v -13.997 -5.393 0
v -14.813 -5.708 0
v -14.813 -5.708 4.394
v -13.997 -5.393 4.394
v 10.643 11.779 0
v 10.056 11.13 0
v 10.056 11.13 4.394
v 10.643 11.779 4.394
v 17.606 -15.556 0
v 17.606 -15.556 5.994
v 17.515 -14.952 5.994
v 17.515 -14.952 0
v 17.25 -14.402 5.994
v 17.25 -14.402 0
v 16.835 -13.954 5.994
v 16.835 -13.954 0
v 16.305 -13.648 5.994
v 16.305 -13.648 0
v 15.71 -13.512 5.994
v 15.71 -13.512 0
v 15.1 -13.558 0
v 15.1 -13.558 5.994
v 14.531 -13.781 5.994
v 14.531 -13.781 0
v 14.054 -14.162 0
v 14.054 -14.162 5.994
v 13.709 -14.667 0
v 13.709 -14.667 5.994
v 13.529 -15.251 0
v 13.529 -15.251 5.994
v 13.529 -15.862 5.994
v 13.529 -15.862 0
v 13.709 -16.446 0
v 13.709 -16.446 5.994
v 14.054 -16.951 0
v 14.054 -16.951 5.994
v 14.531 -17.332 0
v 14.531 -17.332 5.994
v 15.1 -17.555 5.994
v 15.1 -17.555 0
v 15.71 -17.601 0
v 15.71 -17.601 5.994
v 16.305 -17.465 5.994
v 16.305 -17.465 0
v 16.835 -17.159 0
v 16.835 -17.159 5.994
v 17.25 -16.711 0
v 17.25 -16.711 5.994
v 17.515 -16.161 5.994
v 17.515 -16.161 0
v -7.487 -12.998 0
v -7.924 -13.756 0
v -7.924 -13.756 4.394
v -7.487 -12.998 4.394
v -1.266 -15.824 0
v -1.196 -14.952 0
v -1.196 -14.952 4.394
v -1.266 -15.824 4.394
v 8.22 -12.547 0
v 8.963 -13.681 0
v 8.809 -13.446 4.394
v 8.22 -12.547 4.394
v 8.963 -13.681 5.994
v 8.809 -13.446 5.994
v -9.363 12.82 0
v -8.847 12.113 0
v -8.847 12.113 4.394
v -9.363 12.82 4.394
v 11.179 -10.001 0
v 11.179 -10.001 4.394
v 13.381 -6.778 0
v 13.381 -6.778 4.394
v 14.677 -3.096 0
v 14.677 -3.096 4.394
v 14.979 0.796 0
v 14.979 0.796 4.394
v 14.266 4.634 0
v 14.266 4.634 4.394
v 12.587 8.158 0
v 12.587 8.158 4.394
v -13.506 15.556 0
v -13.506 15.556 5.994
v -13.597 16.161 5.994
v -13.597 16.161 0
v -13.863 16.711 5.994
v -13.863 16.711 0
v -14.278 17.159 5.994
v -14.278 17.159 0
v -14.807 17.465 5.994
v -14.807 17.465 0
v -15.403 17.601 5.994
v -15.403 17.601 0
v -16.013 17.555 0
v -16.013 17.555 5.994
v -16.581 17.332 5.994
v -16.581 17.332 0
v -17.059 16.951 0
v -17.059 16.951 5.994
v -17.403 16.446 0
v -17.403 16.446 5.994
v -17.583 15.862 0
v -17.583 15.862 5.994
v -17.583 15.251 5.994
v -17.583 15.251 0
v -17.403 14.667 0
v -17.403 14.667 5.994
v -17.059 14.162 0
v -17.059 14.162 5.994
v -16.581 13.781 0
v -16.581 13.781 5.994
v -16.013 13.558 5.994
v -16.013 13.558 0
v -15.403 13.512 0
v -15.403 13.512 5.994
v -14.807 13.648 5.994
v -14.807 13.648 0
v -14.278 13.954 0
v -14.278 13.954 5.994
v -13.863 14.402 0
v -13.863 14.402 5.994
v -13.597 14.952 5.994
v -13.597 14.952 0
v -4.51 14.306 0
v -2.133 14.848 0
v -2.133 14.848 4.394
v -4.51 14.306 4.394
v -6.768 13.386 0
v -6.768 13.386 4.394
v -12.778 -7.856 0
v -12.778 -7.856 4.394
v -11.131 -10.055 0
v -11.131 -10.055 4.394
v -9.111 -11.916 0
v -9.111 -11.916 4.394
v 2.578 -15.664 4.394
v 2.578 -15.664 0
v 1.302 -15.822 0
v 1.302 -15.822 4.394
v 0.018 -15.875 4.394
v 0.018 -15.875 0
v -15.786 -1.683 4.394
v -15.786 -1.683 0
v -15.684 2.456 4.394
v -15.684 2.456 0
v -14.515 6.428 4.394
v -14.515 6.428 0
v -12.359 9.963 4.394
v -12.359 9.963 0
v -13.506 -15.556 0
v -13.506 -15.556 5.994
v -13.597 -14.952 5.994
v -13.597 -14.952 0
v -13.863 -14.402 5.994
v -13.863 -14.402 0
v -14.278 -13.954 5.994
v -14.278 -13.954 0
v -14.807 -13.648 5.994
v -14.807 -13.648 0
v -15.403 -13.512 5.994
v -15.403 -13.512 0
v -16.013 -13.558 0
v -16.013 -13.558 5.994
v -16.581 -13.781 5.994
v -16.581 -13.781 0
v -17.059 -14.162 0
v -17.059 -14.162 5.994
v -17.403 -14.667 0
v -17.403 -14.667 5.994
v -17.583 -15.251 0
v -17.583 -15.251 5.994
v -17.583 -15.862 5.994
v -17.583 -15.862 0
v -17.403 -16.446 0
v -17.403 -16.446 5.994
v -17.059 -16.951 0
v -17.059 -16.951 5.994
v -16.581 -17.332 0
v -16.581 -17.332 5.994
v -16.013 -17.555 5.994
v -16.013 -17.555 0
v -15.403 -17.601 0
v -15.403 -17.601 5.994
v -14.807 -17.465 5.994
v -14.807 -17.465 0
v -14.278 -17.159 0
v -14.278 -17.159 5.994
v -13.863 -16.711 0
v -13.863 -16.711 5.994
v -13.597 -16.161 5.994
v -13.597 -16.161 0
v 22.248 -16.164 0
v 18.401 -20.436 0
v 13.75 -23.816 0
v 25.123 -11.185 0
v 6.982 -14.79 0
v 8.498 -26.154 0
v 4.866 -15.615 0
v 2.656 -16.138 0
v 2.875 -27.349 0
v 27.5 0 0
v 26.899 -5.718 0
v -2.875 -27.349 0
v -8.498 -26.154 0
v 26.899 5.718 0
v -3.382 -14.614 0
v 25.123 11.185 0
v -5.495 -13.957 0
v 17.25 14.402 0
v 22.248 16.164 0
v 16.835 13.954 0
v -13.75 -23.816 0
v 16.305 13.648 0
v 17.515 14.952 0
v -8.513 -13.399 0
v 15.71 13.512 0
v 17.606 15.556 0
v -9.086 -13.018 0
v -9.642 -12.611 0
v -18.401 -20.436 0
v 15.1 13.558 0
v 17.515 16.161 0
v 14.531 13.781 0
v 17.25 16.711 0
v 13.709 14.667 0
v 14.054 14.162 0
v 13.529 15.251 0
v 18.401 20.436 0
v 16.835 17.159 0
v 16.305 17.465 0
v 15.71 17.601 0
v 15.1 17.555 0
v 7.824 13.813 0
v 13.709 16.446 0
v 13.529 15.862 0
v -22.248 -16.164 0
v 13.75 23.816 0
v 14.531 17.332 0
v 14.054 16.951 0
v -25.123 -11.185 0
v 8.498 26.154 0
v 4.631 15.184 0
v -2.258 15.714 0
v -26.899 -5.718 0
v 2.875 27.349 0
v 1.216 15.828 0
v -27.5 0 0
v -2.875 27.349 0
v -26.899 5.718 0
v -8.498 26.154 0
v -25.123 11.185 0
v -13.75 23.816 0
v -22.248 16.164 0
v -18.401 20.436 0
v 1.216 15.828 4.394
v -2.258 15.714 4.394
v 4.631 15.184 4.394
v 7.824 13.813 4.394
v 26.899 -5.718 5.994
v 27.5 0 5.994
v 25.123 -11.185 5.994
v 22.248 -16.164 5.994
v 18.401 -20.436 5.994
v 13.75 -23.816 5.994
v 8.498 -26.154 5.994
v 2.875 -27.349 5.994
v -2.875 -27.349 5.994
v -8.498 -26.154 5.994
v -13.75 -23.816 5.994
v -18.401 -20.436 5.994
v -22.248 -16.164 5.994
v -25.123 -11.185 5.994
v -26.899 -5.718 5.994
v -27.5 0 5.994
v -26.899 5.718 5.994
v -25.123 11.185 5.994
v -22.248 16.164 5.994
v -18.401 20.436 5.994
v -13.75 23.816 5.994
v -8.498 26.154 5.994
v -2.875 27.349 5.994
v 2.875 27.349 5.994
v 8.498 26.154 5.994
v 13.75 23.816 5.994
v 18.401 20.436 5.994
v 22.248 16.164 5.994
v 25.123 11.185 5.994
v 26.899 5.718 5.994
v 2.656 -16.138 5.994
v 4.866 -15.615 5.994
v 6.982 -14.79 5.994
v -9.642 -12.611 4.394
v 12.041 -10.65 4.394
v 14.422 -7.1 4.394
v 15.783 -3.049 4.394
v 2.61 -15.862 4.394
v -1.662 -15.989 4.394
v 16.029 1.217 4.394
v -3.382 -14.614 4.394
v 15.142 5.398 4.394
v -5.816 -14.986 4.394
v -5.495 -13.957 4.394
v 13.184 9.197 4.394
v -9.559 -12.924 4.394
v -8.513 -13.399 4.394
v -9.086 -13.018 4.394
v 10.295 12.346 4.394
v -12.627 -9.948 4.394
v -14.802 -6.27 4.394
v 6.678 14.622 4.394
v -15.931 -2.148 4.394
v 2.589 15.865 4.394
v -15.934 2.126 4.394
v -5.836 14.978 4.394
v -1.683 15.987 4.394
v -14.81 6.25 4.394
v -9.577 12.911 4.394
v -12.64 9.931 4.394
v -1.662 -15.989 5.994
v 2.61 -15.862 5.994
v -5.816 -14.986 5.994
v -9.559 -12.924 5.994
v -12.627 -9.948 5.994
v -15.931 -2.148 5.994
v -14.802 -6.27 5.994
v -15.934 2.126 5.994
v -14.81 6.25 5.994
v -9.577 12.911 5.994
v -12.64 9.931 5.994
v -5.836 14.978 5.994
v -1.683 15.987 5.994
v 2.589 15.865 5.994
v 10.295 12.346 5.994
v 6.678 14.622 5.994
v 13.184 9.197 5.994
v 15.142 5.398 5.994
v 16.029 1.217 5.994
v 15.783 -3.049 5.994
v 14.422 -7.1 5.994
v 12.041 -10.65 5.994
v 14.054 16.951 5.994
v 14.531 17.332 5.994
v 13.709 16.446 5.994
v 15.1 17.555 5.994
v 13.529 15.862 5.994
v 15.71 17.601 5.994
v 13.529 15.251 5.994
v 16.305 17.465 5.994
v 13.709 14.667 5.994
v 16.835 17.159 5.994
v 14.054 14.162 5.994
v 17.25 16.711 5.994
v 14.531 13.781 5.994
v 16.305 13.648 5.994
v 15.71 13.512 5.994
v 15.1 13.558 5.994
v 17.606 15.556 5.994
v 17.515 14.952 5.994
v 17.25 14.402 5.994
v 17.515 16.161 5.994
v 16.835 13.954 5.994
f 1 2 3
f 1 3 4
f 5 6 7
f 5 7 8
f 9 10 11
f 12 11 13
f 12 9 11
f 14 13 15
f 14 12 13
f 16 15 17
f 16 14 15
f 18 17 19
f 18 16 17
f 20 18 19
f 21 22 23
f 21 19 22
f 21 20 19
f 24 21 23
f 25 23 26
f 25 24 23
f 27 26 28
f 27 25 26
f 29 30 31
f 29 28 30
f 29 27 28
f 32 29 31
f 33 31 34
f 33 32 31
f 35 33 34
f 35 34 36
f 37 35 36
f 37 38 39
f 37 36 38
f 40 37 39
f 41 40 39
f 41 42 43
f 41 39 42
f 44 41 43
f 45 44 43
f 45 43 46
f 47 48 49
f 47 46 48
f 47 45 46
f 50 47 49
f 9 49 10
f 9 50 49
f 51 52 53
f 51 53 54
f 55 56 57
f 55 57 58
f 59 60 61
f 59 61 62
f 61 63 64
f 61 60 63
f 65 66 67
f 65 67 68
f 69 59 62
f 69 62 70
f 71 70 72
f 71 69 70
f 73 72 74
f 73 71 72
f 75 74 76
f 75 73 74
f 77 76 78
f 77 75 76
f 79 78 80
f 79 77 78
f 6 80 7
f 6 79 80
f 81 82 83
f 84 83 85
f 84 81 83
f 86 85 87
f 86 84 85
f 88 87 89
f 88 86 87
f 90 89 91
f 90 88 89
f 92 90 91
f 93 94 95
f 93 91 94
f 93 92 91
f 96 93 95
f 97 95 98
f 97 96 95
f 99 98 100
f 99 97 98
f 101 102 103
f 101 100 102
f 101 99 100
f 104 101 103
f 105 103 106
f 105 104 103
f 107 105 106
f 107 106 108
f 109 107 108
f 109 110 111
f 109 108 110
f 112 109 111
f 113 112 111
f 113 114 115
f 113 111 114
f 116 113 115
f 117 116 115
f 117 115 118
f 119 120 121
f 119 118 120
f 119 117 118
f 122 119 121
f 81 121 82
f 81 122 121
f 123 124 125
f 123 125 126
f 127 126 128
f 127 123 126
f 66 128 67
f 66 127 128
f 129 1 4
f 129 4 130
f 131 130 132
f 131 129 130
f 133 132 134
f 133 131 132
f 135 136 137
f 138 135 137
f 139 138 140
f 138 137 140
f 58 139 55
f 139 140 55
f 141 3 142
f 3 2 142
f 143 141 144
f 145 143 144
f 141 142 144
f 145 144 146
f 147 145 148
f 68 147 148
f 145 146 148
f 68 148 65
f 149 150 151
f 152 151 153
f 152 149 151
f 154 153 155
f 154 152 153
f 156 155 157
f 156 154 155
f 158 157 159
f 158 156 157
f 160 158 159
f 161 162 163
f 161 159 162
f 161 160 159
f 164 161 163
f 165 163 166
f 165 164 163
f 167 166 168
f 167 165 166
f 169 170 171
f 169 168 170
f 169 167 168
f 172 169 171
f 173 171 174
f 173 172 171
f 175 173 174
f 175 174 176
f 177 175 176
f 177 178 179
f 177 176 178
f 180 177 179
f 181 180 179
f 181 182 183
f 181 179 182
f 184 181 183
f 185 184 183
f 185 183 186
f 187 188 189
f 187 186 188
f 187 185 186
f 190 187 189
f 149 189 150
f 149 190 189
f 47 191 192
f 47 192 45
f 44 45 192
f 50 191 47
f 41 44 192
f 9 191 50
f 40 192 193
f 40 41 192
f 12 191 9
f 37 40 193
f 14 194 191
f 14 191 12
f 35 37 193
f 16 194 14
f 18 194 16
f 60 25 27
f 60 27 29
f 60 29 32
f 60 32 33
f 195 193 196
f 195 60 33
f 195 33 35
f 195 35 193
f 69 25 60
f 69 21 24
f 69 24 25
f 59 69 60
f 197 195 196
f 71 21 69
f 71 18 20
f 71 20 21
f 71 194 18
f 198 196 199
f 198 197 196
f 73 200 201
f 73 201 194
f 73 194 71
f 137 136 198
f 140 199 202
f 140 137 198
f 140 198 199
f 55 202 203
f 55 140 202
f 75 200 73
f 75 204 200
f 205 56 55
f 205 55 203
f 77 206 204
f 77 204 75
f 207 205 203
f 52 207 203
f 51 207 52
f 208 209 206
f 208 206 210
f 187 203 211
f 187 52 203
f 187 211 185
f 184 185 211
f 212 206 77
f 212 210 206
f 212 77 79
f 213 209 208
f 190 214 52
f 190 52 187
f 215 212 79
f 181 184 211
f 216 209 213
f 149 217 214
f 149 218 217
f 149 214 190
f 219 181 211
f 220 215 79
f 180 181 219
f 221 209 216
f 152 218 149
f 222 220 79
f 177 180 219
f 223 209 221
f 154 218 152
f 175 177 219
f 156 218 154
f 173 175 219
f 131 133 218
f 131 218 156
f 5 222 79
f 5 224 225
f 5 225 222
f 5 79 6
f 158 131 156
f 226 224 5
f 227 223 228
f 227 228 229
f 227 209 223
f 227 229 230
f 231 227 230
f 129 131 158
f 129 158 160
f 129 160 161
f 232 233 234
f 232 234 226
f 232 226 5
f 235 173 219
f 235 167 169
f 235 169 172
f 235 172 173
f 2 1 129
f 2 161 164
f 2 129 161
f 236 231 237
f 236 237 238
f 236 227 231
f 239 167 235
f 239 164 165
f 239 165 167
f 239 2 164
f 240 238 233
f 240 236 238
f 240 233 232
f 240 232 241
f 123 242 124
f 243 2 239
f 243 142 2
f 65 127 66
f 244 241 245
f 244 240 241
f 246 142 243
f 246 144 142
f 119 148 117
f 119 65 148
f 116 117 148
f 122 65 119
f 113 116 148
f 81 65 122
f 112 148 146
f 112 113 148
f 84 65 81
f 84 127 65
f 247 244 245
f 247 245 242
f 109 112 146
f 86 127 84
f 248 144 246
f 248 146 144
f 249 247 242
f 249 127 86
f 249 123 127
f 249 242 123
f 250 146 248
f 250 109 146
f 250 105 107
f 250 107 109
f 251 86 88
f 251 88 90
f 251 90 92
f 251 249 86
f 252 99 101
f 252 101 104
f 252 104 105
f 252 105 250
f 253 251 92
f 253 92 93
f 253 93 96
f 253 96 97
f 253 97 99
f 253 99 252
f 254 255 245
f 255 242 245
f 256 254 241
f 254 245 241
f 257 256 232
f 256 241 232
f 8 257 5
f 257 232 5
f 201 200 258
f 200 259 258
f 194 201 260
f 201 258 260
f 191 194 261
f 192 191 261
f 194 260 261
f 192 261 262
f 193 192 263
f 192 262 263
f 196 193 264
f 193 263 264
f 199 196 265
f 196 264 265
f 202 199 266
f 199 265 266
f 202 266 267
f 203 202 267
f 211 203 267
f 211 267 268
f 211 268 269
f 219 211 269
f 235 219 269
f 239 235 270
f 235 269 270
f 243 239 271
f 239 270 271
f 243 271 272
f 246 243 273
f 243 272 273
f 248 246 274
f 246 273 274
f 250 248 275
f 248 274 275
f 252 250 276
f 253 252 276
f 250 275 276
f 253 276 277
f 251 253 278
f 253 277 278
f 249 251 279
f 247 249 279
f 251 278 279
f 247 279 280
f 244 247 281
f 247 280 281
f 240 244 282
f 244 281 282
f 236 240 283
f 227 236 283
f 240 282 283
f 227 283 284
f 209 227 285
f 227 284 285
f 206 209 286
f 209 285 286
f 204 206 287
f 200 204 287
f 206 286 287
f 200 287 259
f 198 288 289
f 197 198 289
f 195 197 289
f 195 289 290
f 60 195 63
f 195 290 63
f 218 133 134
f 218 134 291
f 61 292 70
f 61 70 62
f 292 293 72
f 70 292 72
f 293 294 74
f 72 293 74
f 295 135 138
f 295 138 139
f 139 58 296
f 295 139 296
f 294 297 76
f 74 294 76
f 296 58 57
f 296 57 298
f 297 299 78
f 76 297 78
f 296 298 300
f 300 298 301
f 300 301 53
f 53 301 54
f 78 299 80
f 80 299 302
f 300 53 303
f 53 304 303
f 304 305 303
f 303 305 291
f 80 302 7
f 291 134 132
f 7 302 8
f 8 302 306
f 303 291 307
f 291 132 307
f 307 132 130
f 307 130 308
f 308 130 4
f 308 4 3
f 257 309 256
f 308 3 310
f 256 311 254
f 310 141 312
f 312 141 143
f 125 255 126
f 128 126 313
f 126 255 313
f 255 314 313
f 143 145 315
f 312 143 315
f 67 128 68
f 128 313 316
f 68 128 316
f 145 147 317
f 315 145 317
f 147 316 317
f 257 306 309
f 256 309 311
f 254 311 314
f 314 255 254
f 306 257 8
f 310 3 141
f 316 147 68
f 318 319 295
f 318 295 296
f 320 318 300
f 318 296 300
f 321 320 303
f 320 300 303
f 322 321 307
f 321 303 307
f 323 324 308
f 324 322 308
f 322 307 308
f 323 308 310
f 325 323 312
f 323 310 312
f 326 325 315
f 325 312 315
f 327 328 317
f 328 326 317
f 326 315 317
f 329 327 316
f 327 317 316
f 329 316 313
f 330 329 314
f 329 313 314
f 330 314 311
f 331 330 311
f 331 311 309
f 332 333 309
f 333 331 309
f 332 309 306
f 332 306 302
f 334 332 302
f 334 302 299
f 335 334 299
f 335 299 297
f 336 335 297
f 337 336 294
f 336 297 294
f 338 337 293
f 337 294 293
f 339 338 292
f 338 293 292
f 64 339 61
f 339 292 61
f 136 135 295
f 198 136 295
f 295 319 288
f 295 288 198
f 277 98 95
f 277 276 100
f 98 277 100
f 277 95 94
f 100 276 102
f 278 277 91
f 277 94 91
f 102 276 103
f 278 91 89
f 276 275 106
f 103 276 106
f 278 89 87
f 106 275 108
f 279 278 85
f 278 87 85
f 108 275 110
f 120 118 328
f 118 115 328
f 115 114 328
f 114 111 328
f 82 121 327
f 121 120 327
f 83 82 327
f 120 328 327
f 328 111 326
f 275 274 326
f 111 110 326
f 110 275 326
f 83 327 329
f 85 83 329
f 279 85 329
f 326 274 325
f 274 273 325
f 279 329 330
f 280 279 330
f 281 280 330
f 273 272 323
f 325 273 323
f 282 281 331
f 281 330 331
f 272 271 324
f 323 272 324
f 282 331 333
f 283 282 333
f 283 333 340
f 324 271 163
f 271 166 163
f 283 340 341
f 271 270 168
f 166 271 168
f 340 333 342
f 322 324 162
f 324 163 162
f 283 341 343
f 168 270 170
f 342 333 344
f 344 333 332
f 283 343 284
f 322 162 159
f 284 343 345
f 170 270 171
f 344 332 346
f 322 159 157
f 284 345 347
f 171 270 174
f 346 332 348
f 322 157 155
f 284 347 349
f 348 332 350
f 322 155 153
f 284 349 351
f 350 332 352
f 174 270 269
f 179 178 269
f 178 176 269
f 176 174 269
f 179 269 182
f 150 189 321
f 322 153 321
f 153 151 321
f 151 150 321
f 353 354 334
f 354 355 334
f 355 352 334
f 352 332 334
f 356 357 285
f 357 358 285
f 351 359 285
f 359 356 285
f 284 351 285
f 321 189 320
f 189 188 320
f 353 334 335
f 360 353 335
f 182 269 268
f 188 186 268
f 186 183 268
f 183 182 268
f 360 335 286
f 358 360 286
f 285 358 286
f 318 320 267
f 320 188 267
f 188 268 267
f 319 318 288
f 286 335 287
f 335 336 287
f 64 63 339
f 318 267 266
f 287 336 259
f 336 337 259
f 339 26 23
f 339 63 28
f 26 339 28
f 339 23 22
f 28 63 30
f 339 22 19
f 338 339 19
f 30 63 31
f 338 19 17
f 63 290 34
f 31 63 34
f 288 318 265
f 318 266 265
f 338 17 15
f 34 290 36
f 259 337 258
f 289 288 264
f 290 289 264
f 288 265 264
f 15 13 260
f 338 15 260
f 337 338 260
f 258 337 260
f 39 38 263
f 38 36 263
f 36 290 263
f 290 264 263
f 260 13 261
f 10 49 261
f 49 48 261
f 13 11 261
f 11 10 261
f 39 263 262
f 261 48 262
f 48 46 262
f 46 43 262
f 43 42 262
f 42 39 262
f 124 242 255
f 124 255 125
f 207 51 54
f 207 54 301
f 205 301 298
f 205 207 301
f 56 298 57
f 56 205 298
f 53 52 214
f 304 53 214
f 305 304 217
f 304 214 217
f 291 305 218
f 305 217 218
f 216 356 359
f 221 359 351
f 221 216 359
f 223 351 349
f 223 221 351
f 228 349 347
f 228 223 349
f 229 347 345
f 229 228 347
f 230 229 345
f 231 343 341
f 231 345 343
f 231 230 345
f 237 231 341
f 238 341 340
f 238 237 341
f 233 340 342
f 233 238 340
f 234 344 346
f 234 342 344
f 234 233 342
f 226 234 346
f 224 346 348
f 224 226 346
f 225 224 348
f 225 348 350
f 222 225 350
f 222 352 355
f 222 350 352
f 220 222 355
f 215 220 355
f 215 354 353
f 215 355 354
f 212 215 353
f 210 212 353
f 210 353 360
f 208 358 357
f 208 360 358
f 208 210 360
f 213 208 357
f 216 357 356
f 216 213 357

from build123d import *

# Parameters (mm, degrees)
SKETCH2_R               = 2.05
CUT_EXTRUDE1_DEPTH      = 40.350070343
BOSS_EXTRUDE2_DEPTH     = 4.394
CUT_EXTRUDE2_DEPTH      = 40.350070343
CUT_EXTRUDE2_DEPTH_BACK = 40.350070343


with BuildPart() as part:
    # Sketch1 → Revolve1 (revolve)
    with BuildSketch(Plane(origin=(0, 0, 0), x_dir=(1, 0, 0), z_dir=(0, 1, 0)), mode=Mode.PRIVATE) as revolve1_sk:
        Polygon((-15.875, 0), (-27.5, 0), (-27.5, -5.994), (-16.075, -5.994), (-16.075, -4.394), (-15.875, -4.394), align=None)
    revolve(revolve1_sk.sketch.rotate(Axis((0, 0, 1.024477222), (0, 0, -1)), 180), axis=Axis((0, 0, 1.024477222), (0, 0, -1)))

    # Sketch2 → Cut-Extrude1 (cut, through all)
    with BuildSketch(Plane.XY):
        with Locations((-15.556349186, 15.556349186)):
            Circle(SKETCH2_R)
        with Locations((15.556349186, 15.556349186)):
            Circle(SKETCH2_R)
        with Locations((15.556349186, -15.556349186)):
            Circle(SKETCH2_R)
        with Locations((-15.556349186, -15.556349186)):
            Circle(SKETCH2_R)
    extrude(amount=CUT_EXTRUDE1_DEPTH, mode=Mode.SUBTRACT)

    # Sketch3 → Boss-Extrude2 (add)
    with BuildSketch(Plane(origin=(0, 0, 0), x_dir=(-1, 0, 0), z_dir=(0, 0, -1))):
        with BuildLine():
            ThreePointArc((-10.642530671, 11.779310927), (-15.76562668, -1.860279655), (-7.608598211, -13.932869707))
            Line((-7.608598211, -13.932869707), (-7.189226656, -13.164916258))
            ThreePointArc((-7.189226656, -13.164916258), (-14.89665513, -1.757744556), (-10.055934492, 11.130057569))
            Line((-10.055934492, 11.130057569), (-10.642530671, 11.779310927))
        make_face()
        with BuildLine():
            Line((7.924235053, -13.755803278), (7.487466192, -12.997609396))
            ThreePointArc((7.487466192, -12.997609396), (4.450525747, -14.324553067), (1.196324742, -14.952217465))
            Line((1.196324742, -14.952217465), (1.266110352, -15.82443015))
            ThreePointArc((1.266110352, -15.82443015), (4.710139749, -15.160151996), (7.924235053, -13.755803278))
        make_face()
        with BuildLine():
            Line((9.110684324, -11.916183582), (9.642140909, -12.611294291))
            ThreePointArc((9.642140909, -12.611294291), (12.705557645, -9.517585299), (14.81331567, -5.708003492))
            Line((14.81331567, -5.708003492), (13.996833704, -5.393389127))
            ThreePointArc((13.996833704, -5.393389127), (12.005251319, -8.992993983), (9.110684324, -11.916183582))
        make_face()
        with BuildLine():
            ThreePointArc((9.362835646, 12.820020814), (5.987616034, 14.702519486), (2.257535542, 15.713661517))
            Line((2.257535542, 15.713661517), (2.133104449, 14.847554189))
            ThreePointArc((2.133104449, 14.847554189), (5.657589953, 13.892144396), (8.846773838, 12.113405494))
            Line((8.846773838, 12.113405494), (9.362835646, 12.820020814))
        make_face()
    extrude(amount=-BOSS_EXTRUDE2_DEPTH)

    # Sketch4 → Cut-Extrude2 (cut, two sides: drawn at the far end of the back side and taken through both)
    with BuildSketch(Plane(origin=(0, 0, 0), x_dir=(-1, 0, 0), z_dir=(0, 0, -1)).offset(-CUT_EXTRUDE2_DEPTH_BACK)):
        with BuildLine():
            Line((-8.963010633, -13.680627024), (0, 0))
            Line((0, 0), (-2.655754961, -16.138218023))
            ThreePointArc((-2.655754961, -16.138218023), (-5.937917721, -15.239299476), (-8.963010633, -13.680627024))
        make_face()
    extrude(amount=CUT_EXTRUDE2_DEPTH + CUT_EXTRUDE2_DEPTH_BACK, mode=Mode.SUBTRACT)


solid = part.part
